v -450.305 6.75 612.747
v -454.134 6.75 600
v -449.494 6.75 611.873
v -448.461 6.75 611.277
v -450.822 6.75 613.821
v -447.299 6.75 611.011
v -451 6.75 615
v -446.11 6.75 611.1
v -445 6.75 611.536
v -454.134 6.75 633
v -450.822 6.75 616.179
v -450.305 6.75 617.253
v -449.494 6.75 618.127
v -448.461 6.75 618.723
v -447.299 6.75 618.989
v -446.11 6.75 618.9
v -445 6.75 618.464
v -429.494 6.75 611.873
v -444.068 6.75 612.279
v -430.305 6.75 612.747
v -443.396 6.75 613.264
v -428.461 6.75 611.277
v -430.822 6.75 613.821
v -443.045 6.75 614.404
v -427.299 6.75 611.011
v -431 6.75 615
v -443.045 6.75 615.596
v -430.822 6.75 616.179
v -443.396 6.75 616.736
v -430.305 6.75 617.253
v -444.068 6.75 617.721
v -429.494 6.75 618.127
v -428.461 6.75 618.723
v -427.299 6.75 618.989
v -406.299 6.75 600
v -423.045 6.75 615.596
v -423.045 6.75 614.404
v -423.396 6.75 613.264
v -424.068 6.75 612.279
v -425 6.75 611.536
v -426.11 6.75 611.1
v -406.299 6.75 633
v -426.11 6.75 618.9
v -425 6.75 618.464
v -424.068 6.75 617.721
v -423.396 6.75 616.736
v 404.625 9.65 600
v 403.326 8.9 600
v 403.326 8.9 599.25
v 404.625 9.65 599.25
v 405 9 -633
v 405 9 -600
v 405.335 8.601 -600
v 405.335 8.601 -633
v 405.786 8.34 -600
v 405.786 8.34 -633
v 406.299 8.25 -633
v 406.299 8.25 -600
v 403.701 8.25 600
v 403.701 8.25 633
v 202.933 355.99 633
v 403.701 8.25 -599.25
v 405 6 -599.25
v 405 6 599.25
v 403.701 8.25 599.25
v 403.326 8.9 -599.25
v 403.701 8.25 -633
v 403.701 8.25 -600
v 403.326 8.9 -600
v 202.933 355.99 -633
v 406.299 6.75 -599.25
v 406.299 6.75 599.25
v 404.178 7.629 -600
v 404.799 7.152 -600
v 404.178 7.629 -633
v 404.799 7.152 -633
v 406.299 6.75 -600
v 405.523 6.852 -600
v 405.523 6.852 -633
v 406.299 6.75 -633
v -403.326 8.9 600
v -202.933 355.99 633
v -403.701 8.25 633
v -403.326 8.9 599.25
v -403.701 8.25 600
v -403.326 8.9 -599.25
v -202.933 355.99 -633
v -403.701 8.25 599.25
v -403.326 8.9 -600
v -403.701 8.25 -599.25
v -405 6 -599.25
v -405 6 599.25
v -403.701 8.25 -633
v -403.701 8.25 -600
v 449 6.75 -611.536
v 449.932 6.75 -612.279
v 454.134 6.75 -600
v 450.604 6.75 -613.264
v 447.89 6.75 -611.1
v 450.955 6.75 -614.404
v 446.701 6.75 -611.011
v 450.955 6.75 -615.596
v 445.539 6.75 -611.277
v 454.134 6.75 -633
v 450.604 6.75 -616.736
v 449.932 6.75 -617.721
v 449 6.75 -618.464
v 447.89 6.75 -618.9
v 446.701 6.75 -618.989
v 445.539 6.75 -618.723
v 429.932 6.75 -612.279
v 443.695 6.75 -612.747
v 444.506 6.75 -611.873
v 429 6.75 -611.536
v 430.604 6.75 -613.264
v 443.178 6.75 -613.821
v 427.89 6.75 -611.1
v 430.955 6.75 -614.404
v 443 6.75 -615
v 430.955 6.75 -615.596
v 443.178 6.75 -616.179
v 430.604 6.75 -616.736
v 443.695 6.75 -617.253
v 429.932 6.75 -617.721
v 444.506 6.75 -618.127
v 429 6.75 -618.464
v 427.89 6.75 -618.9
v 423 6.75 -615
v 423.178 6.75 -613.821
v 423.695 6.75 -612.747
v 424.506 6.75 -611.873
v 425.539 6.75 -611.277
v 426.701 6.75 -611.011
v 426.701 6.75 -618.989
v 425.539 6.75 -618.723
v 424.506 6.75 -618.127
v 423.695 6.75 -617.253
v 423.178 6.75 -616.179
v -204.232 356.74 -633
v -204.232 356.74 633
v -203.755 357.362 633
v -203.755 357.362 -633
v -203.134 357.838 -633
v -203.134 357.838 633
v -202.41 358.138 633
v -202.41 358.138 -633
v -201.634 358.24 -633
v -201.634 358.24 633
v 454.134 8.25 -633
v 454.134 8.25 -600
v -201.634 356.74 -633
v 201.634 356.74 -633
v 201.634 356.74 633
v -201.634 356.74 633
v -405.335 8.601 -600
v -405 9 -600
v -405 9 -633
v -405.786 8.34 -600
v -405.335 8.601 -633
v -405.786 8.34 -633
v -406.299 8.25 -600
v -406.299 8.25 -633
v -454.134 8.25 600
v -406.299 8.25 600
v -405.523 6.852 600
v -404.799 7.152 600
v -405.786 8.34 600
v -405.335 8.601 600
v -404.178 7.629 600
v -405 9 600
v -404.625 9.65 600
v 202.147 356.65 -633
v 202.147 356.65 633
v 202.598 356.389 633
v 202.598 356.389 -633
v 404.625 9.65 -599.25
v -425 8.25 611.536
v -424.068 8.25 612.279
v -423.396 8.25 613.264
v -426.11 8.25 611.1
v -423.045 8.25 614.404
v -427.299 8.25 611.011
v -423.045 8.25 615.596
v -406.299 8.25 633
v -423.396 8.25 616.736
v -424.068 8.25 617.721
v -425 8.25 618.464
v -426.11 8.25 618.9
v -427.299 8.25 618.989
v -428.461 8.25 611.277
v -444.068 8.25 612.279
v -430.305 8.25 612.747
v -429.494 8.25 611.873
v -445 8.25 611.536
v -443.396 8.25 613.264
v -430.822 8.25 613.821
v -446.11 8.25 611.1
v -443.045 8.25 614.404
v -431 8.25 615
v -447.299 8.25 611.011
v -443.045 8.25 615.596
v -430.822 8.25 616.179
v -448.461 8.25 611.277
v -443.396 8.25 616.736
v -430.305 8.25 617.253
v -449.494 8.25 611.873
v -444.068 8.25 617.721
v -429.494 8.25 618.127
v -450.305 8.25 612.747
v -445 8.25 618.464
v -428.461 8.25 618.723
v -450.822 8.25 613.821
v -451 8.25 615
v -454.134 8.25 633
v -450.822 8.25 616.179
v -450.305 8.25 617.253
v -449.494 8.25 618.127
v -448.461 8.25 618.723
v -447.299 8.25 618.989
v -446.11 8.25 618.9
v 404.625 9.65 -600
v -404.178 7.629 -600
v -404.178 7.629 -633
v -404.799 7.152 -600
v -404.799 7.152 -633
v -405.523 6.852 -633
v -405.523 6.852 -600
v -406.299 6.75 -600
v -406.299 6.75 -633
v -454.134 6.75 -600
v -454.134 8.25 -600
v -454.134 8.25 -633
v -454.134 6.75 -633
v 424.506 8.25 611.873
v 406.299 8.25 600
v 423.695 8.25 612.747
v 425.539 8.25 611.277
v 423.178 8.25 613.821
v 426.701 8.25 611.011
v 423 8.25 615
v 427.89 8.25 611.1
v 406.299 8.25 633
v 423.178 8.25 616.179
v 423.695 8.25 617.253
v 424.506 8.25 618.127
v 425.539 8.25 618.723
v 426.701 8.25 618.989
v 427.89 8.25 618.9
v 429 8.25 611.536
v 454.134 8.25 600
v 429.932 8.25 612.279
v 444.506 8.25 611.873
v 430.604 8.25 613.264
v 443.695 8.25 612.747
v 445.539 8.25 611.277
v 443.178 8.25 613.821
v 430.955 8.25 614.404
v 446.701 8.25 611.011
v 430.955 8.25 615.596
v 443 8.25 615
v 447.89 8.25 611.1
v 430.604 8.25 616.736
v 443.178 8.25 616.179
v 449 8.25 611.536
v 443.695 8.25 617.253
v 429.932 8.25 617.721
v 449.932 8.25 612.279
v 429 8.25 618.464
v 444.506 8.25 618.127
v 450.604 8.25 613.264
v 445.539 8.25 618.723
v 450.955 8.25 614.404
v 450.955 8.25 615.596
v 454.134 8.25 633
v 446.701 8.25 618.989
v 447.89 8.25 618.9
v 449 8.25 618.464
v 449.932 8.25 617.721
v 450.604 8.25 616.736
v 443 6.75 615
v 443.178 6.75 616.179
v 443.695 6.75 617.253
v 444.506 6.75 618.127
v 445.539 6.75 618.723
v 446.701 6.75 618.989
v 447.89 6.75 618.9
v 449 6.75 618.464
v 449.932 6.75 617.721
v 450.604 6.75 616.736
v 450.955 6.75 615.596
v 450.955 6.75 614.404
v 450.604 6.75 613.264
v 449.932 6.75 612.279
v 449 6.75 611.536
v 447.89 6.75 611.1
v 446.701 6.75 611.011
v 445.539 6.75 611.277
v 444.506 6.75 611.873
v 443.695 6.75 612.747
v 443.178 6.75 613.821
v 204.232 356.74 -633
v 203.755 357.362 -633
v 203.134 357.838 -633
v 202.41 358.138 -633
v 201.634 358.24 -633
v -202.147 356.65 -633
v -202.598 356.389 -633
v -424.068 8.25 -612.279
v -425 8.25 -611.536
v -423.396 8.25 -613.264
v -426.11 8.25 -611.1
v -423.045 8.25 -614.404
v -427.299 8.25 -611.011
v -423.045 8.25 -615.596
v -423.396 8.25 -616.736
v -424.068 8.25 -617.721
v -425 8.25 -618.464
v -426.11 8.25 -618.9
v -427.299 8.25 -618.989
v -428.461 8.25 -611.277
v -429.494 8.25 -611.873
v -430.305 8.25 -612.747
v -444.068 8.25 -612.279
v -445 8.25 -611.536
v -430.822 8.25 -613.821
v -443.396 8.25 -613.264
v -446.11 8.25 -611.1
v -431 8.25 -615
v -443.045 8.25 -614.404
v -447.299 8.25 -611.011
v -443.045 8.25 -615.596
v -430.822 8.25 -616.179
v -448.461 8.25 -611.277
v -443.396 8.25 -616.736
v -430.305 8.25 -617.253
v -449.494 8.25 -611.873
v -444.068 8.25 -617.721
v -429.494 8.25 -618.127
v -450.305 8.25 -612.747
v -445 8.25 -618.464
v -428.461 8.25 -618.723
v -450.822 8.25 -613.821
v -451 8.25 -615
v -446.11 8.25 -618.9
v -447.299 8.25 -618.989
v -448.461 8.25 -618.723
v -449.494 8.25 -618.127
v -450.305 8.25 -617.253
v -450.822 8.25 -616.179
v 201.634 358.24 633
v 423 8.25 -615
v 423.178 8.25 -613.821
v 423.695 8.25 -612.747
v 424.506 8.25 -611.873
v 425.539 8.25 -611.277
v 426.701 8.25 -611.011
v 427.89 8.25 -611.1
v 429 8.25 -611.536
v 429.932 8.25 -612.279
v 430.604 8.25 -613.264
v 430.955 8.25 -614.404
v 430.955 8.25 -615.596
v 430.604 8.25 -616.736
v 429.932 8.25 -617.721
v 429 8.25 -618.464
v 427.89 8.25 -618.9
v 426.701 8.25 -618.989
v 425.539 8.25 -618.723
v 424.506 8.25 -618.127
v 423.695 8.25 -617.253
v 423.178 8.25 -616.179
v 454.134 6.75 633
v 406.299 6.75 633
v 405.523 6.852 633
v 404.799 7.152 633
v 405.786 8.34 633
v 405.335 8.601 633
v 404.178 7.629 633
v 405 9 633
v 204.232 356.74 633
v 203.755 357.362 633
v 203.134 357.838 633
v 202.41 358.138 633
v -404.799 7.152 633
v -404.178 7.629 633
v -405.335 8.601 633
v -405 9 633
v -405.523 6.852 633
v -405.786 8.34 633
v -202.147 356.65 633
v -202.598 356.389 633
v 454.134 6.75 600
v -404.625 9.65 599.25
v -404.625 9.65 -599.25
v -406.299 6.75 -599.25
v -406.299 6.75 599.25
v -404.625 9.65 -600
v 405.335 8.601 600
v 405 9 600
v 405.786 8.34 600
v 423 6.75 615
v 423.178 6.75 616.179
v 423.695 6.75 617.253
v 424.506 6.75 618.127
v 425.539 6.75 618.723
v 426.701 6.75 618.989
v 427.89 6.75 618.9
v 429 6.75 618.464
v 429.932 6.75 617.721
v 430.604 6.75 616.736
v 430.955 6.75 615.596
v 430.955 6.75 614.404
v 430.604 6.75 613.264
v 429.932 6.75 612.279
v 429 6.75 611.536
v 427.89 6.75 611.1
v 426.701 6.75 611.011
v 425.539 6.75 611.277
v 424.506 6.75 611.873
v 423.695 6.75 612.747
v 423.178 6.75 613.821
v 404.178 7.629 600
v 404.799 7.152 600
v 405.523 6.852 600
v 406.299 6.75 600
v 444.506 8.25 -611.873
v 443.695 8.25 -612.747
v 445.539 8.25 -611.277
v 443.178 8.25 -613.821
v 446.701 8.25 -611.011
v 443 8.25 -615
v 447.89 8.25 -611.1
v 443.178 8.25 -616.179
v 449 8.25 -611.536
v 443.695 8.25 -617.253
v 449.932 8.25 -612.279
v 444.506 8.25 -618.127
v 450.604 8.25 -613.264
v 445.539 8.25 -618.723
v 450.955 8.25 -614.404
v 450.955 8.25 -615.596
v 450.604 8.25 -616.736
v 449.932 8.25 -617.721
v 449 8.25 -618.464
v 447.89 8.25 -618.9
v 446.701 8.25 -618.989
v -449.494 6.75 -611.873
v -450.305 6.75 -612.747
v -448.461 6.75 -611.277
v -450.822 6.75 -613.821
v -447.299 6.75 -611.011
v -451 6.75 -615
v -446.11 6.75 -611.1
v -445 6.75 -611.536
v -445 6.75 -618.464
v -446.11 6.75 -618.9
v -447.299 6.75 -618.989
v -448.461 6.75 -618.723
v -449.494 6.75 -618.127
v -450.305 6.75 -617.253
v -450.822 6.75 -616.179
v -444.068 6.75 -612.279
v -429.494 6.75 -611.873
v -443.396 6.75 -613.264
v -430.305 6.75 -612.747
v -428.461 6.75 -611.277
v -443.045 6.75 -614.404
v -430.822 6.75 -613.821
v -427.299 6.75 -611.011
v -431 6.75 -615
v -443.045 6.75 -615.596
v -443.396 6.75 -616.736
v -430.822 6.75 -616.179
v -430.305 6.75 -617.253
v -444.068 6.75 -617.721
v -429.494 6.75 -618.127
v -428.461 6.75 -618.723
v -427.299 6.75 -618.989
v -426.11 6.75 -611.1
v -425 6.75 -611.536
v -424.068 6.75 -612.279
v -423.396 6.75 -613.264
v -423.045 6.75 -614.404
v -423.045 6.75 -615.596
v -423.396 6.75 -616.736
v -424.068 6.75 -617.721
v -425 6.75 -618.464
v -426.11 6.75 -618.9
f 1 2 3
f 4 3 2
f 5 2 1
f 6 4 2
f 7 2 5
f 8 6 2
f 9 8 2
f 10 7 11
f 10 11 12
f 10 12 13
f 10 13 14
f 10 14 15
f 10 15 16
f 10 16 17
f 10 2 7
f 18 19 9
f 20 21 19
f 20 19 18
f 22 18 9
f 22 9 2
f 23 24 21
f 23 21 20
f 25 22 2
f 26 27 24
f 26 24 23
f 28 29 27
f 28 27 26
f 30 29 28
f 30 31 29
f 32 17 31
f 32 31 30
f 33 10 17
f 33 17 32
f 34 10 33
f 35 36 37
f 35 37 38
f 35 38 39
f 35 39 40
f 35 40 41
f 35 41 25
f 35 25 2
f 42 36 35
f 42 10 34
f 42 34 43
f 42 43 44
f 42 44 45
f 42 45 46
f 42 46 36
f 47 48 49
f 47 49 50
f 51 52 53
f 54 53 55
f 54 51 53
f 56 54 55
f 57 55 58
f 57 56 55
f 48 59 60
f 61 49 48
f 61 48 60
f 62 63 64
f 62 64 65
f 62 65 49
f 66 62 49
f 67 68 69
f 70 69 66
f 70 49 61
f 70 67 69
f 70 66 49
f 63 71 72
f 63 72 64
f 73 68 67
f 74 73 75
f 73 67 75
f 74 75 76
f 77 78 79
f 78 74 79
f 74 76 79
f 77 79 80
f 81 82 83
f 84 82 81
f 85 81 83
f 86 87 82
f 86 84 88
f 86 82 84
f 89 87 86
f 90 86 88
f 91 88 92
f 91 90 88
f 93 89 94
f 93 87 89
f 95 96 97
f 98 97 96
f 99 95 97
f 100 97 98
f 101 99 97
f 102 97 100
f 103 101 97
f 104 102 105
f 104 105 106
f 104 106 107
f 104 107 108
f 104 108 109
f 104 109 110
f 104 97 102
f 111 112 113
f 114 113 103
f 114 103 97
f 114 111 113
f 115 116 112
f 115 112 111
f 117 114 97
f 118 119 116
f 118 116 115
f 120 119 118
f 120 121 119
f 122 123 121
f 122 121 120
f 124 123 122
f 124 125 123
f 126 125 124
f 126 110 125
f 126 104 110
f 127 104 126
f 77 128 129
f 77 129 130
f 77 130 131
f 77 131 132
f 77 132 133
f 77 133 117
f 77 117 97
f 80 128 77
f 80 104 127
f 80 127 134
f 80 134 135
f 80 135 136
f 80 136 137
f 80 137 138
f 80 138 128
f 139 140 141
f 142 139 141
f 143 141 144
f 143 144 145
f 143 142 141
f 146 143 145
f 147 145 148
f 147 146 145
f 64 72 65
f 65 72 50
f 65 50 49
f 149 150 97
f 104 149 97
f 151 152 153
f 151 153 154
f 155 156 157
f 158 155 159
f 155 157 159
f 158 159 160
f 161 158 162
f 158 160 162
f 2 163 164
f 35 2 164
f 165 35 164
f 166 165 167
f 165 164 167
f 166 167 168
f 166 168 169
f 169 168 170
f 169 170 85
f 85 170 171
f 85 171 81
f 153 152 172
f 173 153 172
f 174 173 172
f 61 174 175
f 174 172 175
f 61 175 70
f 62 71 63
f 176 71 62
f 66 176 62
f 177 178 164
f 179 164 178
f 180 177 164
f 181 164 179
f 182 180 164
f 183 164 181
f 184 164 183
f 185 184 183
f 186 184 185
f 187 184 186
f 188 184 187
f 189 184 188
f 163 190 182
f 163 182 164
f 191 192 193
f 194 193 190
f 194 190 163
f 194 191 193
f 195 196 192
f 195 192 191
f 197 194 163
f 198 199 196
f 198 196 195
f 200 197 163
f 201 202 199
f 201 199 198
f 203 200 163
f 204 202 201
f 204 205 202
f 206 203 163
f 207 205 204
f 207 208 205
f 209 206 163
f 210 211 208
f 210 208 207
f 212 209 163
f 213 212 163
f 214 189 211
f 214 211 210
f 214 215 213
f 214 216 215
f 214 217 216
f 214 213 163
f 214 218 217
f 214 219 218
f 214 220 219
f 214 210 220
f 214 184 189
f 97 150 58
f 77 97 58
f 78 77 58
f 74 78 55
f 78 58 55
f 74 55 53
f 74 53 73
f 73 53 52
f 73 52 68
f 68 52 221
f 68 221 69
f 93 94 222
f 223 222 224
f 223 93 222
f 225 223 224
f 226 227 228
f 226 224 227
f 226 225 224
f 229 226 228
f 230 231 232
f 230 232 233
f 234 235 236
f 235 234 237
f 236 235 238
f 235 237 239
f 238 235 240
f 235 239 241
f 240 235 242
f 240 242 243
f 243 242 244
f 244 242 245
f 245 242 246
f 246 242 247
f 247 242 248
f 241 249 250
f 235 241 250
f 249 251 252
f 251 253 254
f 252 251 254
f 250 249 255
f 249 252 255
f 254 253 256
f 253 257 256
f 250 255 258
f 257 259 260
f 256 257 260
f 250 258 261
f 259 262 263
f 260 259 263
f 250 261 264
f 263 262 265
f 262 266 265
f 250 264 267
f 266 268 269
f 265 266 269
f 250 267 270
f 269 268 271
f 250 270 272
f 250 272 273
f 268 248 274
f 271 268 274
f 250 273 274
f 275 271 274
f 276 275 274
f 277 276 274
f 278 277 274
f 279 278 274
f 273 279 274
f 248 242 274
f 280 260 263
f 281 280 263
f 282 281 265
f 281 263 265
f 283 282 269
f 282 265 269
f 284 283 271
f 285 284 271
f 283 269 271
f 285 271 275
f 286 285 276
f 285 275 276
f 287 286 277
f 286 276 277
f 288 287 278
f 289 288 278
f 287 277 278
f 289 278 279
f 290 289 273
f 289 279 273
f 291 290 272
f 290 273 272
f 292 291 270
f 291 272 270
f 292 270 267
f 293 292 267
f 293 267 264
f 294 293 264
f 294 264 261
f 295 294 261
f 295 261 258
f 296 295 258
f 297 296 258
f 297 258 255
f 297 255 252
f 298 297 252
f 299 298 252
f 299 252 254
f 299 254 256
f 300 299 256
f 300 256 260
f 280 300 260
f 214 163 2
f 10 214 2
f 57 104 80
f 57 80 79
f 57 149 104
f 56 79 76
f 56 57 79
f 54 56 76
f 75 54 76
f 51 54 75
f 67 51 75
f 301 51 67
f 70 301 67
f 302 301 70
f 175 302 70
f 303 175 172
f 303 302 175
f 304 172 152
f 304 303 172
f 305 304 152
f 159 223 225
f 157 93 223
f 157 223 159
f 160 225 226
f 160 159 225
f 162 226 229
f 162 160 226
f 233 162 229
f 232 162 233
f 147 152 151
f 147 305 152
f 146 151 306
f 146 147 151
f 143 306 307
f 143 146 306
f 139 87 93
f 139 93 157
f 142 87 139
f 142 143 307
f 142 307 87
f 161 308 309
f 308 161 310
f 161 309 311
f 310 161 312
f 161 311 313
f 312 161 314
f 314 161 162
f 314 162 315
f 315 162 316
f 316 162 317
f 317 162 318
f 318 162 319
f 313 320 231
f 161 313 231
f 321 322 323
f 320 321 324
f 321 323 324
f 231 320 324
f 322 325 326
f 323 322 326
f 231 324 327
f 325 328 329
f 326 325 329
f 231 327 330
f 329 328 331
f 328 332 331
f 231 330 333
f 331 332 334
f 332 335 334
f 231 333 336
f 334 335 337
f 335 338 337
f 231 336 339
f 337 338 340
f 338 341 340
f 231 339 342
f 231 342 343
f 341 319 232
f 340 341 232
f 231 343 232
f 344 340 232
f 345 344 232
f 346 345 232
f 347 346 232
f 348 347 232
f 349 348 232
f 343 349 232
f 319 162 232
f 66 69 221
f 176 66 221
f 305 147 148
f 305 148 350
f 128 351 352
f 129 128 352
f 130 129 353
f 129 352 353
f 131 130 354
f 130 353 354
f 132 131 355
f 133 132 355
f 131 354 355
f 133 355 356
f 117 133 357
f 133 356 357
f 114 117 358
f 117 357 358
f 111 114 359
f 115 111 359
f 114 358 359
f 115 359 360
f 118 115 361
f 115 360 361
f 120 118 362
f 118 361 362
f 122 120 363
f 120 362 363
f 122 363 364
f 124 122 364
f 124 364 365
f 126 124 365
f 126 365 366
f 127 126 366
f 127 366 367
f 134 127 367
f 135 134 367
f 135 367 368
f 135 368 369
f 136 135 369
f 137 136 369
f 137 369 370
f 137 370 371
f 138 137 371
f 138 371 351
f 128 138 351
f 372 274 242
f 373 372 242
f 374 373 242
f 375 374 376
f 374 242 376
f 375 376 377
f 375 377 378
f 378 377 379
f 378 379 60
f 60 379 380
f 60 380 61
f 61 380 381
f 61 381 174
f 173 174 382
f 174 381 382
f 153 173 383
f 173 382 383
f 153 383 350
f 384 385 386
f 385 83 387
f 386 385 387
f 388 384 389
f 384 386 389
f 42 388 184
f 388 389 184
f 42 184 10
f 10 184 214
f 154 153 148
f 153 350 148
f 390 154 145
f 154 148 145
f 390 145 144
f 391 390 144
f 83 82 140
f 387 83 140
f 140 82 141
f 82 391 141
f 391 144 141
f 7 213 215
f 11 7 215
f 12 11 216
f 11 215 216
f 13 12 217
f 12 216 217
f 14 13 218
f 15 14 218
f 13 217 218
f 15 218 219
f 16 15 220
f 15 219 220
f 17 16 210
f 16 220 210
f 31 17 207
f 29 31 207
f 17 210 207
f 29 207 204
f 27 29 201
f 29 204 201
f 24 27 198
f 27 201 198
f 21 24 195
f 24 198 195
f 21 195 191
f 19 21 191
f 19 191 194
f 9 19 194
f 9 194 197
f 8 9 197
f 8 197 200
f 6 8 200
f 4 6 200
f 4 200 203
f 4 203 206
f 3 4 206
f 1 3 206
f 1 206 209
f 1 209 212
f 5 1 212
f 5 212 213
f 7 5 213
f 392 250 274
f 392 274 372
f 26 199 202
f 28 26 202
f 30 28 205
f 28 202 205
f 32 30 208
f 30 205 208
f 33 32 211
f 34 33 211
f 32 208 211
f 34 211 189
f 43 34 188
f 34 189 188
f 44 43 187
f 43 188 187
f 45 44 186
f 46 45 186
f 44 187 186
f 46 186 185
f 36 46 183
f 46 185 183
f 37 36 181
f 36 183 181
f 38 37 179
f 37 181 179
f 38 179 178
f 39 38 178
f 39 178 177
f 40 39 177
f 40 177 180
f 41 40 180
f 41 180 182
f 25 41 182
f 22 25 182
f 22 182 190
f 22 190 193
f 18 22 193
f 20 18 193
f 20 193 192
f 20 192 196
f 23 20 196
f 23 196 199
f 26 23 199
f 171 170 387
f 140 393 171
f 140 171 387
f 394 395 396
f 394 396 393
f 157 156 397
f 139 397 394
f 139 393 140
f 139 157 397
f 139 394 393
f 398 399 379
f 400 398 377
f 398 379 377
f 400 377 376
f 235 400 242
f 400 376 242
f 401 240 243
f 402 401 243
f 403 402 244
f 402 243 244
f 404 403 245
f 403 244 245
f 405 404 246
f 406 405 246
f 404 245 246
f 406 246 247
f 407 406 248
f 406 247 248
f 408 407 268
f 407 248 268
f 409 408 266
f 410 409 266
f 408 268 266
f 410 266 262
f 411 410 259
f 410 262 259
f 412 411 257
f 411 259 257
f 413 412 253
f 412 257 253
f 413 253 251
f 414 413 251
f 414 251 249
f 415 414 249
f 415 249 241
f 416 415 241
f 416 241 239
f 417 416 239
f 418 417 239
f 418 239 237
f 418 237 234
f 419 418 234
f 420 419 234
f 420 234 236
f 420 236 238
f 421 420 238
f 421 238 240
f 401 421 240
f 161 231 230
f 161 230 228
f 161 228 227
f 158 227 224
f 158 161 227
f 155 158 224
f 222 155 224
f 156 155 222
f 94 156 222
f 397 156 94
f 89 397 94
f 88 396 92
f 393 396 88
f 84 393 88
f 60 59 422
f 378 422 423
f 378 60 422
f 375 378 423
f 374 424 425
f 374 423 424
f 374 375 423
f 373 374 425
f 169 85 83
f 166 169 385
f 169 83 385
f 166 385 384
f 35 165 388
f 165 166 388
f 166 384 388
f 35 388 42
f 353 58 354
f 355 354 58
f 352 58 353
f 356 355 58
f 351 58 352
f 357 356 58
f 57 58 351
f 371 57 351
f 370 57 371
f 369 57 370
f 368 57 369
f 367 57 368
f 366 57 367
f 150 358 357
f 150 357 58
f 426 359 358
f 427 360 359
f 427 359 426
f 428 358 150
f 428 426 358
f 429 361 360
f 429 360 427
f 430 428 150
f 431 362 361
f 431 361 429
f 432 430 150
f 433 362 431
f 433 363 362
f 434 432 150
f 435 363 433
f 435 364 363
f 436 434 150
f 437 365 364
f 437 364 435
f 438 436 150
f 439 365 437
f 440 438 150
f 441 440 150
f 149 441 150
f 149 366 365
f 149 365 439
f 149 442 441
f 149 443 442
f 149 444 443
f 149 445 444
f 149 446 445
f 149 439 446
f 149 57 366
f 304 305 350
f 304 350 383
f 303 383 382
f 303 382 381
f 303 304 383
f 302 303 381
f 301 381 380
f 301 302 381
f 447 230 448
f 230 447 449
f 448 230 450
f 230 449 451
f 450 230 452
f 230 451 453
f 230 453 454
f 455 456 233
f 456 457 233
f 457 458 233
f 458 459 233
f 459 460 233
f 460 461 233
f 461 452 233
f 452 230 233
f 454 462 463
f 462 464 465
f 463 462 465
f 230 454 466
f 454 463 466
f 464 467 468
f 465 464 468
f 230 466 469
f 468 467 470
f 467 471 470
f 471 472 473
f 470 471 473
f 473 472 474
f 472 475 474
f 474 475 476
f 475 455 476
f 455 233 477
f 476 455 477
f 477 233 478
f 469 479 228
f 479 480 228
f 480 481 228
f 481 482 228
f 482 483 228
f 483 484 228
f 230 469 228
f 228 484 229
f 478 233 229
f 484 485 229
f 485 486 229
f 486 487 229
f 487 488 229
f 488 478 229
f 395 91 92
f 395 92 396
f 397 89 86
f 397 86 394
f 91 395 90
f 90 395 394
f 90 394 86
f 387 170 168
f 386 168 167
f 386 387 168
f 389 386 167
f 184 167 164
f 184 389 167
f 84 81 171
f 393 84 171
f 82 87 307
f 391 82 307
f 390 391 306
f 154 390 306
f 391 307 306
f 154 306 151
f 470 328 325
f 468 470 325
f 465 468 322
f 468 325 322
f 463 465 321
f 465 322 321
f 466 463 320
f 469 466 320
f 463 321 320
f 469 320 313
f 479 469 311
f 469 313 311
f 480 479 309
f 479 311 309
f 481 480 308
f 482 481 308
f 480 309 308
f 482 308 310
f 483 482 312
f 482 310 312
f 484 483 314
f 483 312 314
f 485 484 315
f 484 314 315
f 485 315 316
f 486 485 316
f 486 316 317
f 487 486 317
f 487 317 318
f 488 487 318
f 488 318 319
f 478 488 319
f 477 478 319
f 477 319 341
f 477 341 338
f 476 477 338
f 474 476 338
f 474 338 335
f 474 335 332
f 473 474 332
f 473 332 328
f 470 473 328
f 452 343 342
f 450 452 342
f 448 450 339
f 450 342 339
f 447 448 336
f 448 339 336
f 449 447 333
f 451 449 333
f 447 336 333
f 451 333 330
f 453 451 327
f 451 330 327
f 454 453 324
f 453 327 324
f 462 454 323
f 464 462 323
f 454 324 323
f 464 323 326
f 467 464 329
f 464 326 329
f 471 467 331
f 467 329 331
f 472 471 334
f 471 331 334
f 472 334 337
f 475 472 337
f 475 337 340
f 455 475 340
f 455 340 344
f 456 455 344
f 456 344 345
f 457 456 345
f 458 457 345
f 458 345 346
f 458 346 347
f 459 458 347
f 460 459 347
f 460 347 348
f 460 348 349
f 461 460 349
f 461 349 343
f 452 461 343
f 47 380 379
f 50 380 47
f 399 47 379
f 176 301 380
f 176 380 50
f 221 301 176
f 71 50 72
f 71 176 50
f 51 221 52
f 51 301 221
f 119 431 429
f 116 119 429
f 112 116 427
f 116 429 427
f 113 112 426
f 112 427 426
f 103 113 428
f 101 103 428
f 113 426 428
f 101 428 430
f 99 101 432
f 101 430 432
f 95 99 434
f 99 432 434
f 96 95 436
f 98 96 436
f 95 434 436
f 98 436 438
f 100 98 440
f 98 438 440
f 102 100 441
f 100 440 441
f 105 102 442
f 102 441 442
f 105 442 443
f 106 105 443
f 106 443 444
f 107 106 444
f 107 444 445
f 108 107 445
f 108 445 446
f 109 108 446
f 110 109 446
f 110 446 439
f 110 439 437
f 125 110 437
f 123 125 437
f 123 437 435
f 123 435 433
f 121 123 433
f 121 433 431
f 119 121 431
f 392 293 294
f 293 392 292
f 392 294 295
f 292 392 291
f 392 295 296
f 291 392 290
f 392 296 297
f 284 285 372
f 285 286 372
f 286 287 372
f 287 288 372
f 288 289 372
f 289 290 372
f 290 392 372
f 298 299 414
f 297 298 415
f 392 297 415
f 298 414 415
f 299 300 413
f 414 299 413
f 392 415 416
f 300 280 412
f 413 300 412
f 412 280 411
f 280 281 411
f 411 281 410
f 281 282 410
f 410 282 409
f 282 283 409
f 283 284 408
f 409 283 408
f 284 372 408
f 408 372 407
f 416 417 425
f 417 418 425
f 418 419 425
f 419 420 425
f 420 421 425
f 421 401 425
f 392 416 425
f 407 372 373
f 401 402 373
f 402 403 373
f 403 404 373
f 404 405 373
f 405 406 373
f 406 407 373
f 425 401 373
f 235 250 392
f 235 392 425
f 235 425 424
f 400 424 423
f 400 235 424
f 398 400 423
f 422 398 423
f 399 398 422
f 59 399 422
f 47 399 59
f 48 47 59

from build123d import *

# Parameters (mm, degrees)
EXTRUDE_1_DEPTH          = 633
EXTRUDE_1_DEPTH_BACK     = 633
SHEET_START              = -633
SHEET_METAL_1_DEPTH      = 1266
SHEET_METAL_1_2_DEPTH    = 1266
SM_START                 = -633
SM_EDGE_FLANGE_1_DEPTH   = 33.75
SM_START_2               = -600
SM_EDGE_FLANGE_1_2_DEPTH = 0.75
SM_EDGE_FLANGE_1_3_DEPTH = 33
MIRROR_START             = -633
MIRROR_2_COPY_1_DEPTH    = 33.75
MIRROR_START_2           = -600
MIRROR_2_COPY_2_DEPTH    = 0.75
MIRROR_2_COPY_3_DEPTH    = 33
MIRROR_2_COPY_4_DEPTH    = 0.75
MIRROR_2_COPY_5_DEPTH    = 33
CUT_EXTRUDE_1_REACH      = 856.061
SKETCH_9_R               = 4


# Read off the part's stored shape, not the designer's step: Преобразовать-Твердое тело1, Ребро-кромка1
with BuildPart() as part:
    # Sketch 1 → Вытянуть-Тонкостенный1 (new, two sides: drawn at the far end of the back side and taken through both)
    with BuildSketch(Plane.XY.offset(-EXTRUDE_1_DEPTH_BACK)):
        Polygon((405, 6), (202.5, 356.740288533), (-202.5, 356.740288533), (-405, 6), (-406.299038106, 6.75), (-203.366025404, 358.240288533), (203.366025404, 358.240288533), (406.299038106, 6.75), align=None)
    extrude(amount=EXTRUDE_1_DEPTH + EXTRUDE_1_DEPTH_BACK)

    # Sheet Metal 1 outline → Sheet Metal 1 (cut)
    with BuildSketch(Plane.XY.offset(SHEET_START)):
        with BuildLine():
            Line((203.366025404, 358.240288533), (201.633974596, 358.240288533))
            ThreePointArc((201.633974596, 358.240288533), (203.133974596, 357.838364744), (204.232050808, 356.740288533))
            Line((204.232050808, 356.740288533), (203.366025404, 358.240288533))
        make_face()
        with BuildLine():
            ThreePointArc((-204.232050808, 356.740288533), (-203.133974596, 357.838364744), (-201.633974596, 358.240288533))
            Line((-201.633974596, 358.240288533), (-203.366025404, 358.240288533))
            Line((-203.366025404, 358.240288533), (-204.232050808, 356.740288533))
        make_face()
    extrude(amount=SHEET_METAL_1_DEPTH, mode=Mode.SUBTRACT)

    # Sheet Metal 1 2 outline → Sheet Metal 1 2 (add)
    with BuildSketch(Plane.XY.offset(SHEET_START)):
        with BuildLine():
            Line((202.5, 356.740288533), (201.633974596, 356.740288533))
            ThreePointArc((201.633974596, 356.740288533), (202.383974596, 356.539326638), (202.933012702, 355.990288533))
            Line((202.933012702, 355.990288533), (202.5, 356.740288533))
        make_face()
        with BuildLine():
            ThreePointArc((-202.933012702, 355.990288533), (-202.383974596, 356.539326638), (-201.633974596, 356.740288533))
            Line((-201.633974596, 356.740288533), (-202.5, 356.740288533))
            Line((-202.5, 356.740288533), (-202.933012702, 355.990288533))
        make_face()
    extrude(amount=SHEET_METAL_1_2_DEPTH)

    # Ребро-кромка1 outline → Ребро-кромка1 (cut)
    with BuildSketch(Plane.XY.offset(SM_START)):
        with BuildLine():
            Line((-405, 6), (-403.700961894, 8.25))
            ThreePointArc((-403.700961894, 8.25), (-404.799038106, 7.151923789), (-406.299038106, 6.75))
            Line((-406.299038106, 6.75), (-405, 6))
        make_face()
    sm_edge_flange_1 = extrude(amount=SM_EDGE_FLANGE_1_DEPTH, mode=Mode.SUBTRACT)

    # Sm Edge Flange 1 2 outline → Sm Edge Flange 1 2 (cut)
    with BuildSketch(Plane.XY.offset(SM_START_2)):
        with BuildLine():
            Line((-403.325961894, 8.899519053), (-404.625, 9.649519053))
            Line((-404.625, 9.649519053), (-406.299038106, 6.75))
            ThreePointArc((-406.299038106, 6.75), (-404.799038106, 7.151923789), (-403.700961894, 8.25))
            Line((-403.700961894, 8.25), (-403.325961894, 8.899519053))
        make_face()
    sm_edge_flange_1_2 = extrude(amount=SM_EDGE_FLANGE_1_2_DEPTH, mode=Mode.SUBTRACT)

    # Sm Edge Flange 1 3 outline → Sm Edge Flange 1 3 (add)
    with BuildSketch(Plane.XY.offset(SM_START)):
        with BuildLine():
            Line((-406.299038106, 6.75), (-405, 9))
            ThreePointArc((-405, 9), (-405.549038106, 8.450961894), (-406.299038106, 8.25))
            Line((-406.299038106, 8.25), (-454.133974596, 8.25))
            Line((-454.133974596, 8.25), (-454.133974596, 6.75))
            Line((-454.133974596, 6.75), (-406.299038106, 6.75))
        make_face()
    sm_edge_flange_1_3 = extrude(amount=SM_EDGE_FLANGE_1_3_DEPTH)

    # Зеркальное отражение1: Ребро-кромка1, Sm Edge Flange 1 2, Sm Edge Flange 1 3 across plane
    add(sm_edge_flange_1.mirror(Plane.XY), mode=Mode.SUBTRACT)
    add(sm_edge_flange_1_2.mirror(Plane.XY), mode=Mode.SUBTRACT)
    add(sm_edge_flange_1_3.mirror(Plane.XY))

    # Зеркальное отражение2: Ребро-кромка1, Sm Edge Flange 1 2, Sm Edge Flange 1 3 across plane
    add(sm_edge_flange_1.mirror(Plane(origin=(0, 0, 0), x_dir=(0, 0, 1), z_dir=(1, 0, 0))), mode=Mode.SUBTRACT)
    add(sm_edge_flange_1_2.mirror(Plane(origin=(0, 0, 0), x_dir=(0, 0, 1), z_dir=(1, 0, 0))), mode=Mode.SUBTRACT)
    add(sm_edge_flange_1_3.mirror(Plane(origin=(0, 0, 0), x_dir=(0, 0, 1), z_dir=(1, 0, 0))))

    # Зеркальное отражение2 copy 1 sketch → Зеркальное отражение2 copy 1 (cut)
    with BuildSketch(Plane(origin=(0, 0, 0), x_dir=(-1, 0, 0), z_dir=(0, 0, -1)).offset(MIRROR_START)):
        with BuildLine():
            Line((-405, 6), (-403.700961894, 8.25))
            ThreePointArc((-403.700961894, 8.25), (-404.799038106, 7.151923789), (-406.299038106, 6.75))
            Line((-406.299038106, 6.75), (-405, 6))
        make_face()
    extrude(amount=MIRROR_2_COPY_1_DEPTH, mode=Mode.SUBTRACT)

    # Зеркальное отражение2 copy 2 sketch → Зеркальное отражение2 copy 2 (cut)
    with BuildSketch(Plane(origin=(0, 0, 0), x_dir=(-1, 0, 0), z_dir=(0, 0, -1)).offset(MIRROR_START_2)):
        with BuildLine():
            Line((-403.325961894, 8.899519053), (-404.625, 9.649519053))
            Line((-404.625, 9.649519053), (-406.299038106, 6.75))
            ThreePointArc((-406.299038106, 6.75), (-404.799038106, 7.151923789), (-403.700961894, 8.25))
            Line((-403.700961894, 8.25), (-403.325961894, 8.899519053))
        make_face()
    extrude(amount=MIRROR_2_COPY_2_DEPTH, mode=Mode.SUBTRACT)

    # Зеркальное отражение2 copy 3 sketch → Зеркальное отражение2 copy 3 (add)
    with BuildSketch(Plane(origin=(0, 0, 0), x_dir=(-1, 0, 0), z_dir=(0, 0, -1)).offset(MIRROR_START)):
        with BuildLine():
            Line((-406.299038106, 6.75), (-405, 9))
            ThreePointArc((-405, 9), (-405.549038106, 8.450961894), (-406.299038106, 8.25))
            Line((-406.299038106, 8.25), (-454.133974596, 8.25))
            Line((-454.133974596, 8.25), (-454.133974596, 6.75))
            Line((-454.133974596, 6.75), (-406.299038106, 6.75))
        make_face()
    extrude(amount=MIRROR_2_COPY_3_DEPTH)

    # Зеркальное отражение2 copy 4 sketch → Зеркальное отражение2 copy 4 (cut)
    with BuildSketch(Plane(origin=(0, 0, 0), x_dir=(-1, 0, 0), z_dir=(0, 0, 1)).offset(MIRROR_START_2)):
        with BuildLine():
            Line((-403.325961894, -8.899519053), (-404.625, -9.649519053))
            Line((-404.625, -9.649519053), (-406.299038106, -6.75))
            ThreePointArc((-406.299038106, -6.75), (-404.799038106, -7.151923789), (-403.700961894, -8.25))
            Line((-403.700961894, -8.25), (-403.325961894, -8.899519053))
        make_face()
    extrude(amount=MIRROR_2_COPY_4_DEPTH, mode=Mode.SUBTRACT)

    # Зеркальное отражение2 copy 5 sketch → Зеркальное отражение2 copy 5 (add)
    with BuildSketch(Plane(origin=(0, 0, 0), x_dir=(-1, 0, 0), z_dir=(0, 0, 1)).offset(MIRROR_START)):
        with BuildLine():
            Line((-406.299038106, -6.75), (-405, -9))
            ThreePointArc((-405, -9), (-405.549038106, -8.450961894), (-406.299038106, -8.25))
            Line((-406.299038106, -8.25), (-454.133974596, -8.25))
            Line((-454.133974596, -8.25), (-454.133974596, -6.75))
            Line((-454.133974596, -6.75), (-406.299038106, -6.75))
        make_face()
    extrude(amount=MIRROR_2_COPY_5_DEPTH)

    # Эскиз9 → Вырез-Вытянуть1 (cut, up to next)
    with BuildSketch(Plane(origin=(0, 8.25, 0), x_dir=(1, 0, 0), z_dir=(0, 1, 0)), mode=Mode.PRIVATE) as cut_extrude_1_sk1:
        with Locations(Location((-447, 615, 0), (0, 0, 180))):
            Circle(SKETCH_9_R)
    cut_extrude_1_tool1 = extrude(cut_extrude_1_sk1.sketch, amount=-CUT_EXTRUDE_1_REACH, mode=Mode.PRIVATE) & part.part
    # Эскиз9 → Вырез-Вытянуть1 (cut, up to next)
    with BuildSketch(Plane(origin=(0, 8.25, 0), x_dir=(1, 0, 0), z_dir=(0, 1, 0)), mode=Mode.PRIVATE) as cut_extrude_1_sk2:
        with Locations(Location((-427, 615, 0), (0, 0, 180))):
            Circle(SKETCH_9_R)
    cut_extrude_1_tool2 = extrude(cut_extrude_1_sk2.sketch, amount=-CUT_EXTRUDE_1_REACH, mode=Mode.PRIVATE) & part.part
    # Эскиз9 → Вырез-Вытянуть1 (cut, up to next)
    with BuildSketch(Plane(origin=(0, 8.25, 0), x_dir=(1, 0, 0), z_dir=(0, 1, 0)), mode=Mode.PRIVATE) as cut_extrude_1_sk3:
        with Locations(Location((-447, -615, 0), (0, 0, 180))):
            Circle(SKETCH_9_R)
    cut_extrude_1_tool3 = extrude(cut_extrude_1_sk3.sketch, amount=-CUT_EXTRUDE_1_REACH, mode=Mode.PRIVATE) & part.part
    # Эскиз9 → Вырез-Вытянуть1 (cut, up to next)
    with BuildSketch(Plane(origin=(0, 8.25, 0), x_dir=(1, 0, 0), z_dir=(0, 1, 0)), mode=Mode.PRIVATE) as cut_extrude_1_sk4:
        with Locations(Location((-427, -615, 0), (0, 0, 180))):
            Circle(SKETCH_9_R)
    cut_extrude_1_tool4 = extrude(cut_extrude_1_sk4.sketch, amount=-CUT_EXTRUDE_1_REACH, mode=Mode.PRIVATE) & part.part
    # Эскиз9 → Вырез-Вытянуть1 (cut, up to next)
    with BuildSketch(Plane(origin=(0, 8.25, 0), x_dir=(1, 0, 0), z_dir=(0, 1, 0)), mode=Mode.PRIVATE) as cut_extrude_1_sk5:
        with Locations(Location((427, -615, 0), (0, 0, 180))):
            Circle(SKETCH_9_R)
    cut_extrude_1_tool5 = extrude(cut_extrude_1_sk5.sketch, amount=-CUT_EXTRUDE_1_REACH, mode=Mode.PRIVATE) & part.part
    # Эскиз9 → Вырез-Вытянуть1 (cut, up to next)
    with BuildSketch(Plane(origin=(0, 8.25, 0), x_dir=(1, 0, 0), z_dir=(0, 1, 0)), mode=Mode.PRIVATE) as cut_extrude_1_sk6:
        with Locations(Location((447, -615, 0), (0, 0, 180))):
            Circle(SKETCH_9_R)
    cut_extrude_1_tool6 = extrude(cut_extrude_1_sk6.sketch, amount=-CUT_EXTRUDE_1_REACH, mode=Mode.PRIVATE) & part.part
    # Эскиз9 → Вырез-Вытянуть1 (cut, up to next)
    with BuildSketch(Plane(origin=(0, 8.25, 0), x_dir=(1, 0, 0), z_dir=(0, 1, 0)), mode=Mode.PRIVATE) as cut_extrude_1_sk7:
        with Locations(Location((427, 615, 0), (0, 0, 180))):
            Circle(SKETCH_9_R)
    cut_extrude_1_tool7 = extrude(cut_extrude_1_sk7.sketch, amount=-CUT_EXTRUDE_1_REACH, mode=Mode.PRIVATE) & part.part
    # Эскиз9 → Вырез-Вытянуть1 (cut, up to next)
    with BuildSketch(Plane(origin=(0, 8.25, 0), x_dir=(1, 0, 0), z_dir=(0, 1, 0)), mode=Mode.PRIVATE) as cut_extrude_1_sk8:
        with Locations(Location((447, 615, 0), (0, 0, 180))):
            Circle(SKETCH_9_R)
    cut_extrude_1_tool8 = extrude(cut_extrude_1_sk8.sketch, amount=-CUT_EXTRUDE_1_REACH, mode=Mode.PRIVATE) & part.part
    add(cut_extrude_1_tool1.solids().sort_by_distance((-447, 8.25, -615))[0], mode=Mode.SUBTRACT)
    add(cut_extrude_1_tool2.solids().sort_by_distance((-427, 8.25, -615))[0], mode=Mode.SUBTRACT)
    add(cut_extrude_1_tool3.solids().sort_by_distance((-447, 8.25, 615))[0], mode=Mode.SUBTRACT)
    add(cut_extrude_1_tool4.solids().sort_by_distance((-427, 8.25, 615))[0], mode=Mode.SUBTRACT)
    add(cut_extrude_1_tool5.solids().sort_by_distance((427, 8.25, 615))[0], mode=Mode.SUBTRACT)
    add(cut_extrude_1_tool6.solids().sort_by_distance((447, 8.25, 615))[0], mode=Mode.SUBTRACT)
    add(cut_extrude_1_tool7.solids().sort_by_distance((427, 8.25, -615))[0], mode=Mode.SUBTRACT)
    add(cut_extrude_1_tool8.solids().sort_by_distance((447, 8.25, -615))[0], mode=Mode.SUBTRACT)


solid = part.part
